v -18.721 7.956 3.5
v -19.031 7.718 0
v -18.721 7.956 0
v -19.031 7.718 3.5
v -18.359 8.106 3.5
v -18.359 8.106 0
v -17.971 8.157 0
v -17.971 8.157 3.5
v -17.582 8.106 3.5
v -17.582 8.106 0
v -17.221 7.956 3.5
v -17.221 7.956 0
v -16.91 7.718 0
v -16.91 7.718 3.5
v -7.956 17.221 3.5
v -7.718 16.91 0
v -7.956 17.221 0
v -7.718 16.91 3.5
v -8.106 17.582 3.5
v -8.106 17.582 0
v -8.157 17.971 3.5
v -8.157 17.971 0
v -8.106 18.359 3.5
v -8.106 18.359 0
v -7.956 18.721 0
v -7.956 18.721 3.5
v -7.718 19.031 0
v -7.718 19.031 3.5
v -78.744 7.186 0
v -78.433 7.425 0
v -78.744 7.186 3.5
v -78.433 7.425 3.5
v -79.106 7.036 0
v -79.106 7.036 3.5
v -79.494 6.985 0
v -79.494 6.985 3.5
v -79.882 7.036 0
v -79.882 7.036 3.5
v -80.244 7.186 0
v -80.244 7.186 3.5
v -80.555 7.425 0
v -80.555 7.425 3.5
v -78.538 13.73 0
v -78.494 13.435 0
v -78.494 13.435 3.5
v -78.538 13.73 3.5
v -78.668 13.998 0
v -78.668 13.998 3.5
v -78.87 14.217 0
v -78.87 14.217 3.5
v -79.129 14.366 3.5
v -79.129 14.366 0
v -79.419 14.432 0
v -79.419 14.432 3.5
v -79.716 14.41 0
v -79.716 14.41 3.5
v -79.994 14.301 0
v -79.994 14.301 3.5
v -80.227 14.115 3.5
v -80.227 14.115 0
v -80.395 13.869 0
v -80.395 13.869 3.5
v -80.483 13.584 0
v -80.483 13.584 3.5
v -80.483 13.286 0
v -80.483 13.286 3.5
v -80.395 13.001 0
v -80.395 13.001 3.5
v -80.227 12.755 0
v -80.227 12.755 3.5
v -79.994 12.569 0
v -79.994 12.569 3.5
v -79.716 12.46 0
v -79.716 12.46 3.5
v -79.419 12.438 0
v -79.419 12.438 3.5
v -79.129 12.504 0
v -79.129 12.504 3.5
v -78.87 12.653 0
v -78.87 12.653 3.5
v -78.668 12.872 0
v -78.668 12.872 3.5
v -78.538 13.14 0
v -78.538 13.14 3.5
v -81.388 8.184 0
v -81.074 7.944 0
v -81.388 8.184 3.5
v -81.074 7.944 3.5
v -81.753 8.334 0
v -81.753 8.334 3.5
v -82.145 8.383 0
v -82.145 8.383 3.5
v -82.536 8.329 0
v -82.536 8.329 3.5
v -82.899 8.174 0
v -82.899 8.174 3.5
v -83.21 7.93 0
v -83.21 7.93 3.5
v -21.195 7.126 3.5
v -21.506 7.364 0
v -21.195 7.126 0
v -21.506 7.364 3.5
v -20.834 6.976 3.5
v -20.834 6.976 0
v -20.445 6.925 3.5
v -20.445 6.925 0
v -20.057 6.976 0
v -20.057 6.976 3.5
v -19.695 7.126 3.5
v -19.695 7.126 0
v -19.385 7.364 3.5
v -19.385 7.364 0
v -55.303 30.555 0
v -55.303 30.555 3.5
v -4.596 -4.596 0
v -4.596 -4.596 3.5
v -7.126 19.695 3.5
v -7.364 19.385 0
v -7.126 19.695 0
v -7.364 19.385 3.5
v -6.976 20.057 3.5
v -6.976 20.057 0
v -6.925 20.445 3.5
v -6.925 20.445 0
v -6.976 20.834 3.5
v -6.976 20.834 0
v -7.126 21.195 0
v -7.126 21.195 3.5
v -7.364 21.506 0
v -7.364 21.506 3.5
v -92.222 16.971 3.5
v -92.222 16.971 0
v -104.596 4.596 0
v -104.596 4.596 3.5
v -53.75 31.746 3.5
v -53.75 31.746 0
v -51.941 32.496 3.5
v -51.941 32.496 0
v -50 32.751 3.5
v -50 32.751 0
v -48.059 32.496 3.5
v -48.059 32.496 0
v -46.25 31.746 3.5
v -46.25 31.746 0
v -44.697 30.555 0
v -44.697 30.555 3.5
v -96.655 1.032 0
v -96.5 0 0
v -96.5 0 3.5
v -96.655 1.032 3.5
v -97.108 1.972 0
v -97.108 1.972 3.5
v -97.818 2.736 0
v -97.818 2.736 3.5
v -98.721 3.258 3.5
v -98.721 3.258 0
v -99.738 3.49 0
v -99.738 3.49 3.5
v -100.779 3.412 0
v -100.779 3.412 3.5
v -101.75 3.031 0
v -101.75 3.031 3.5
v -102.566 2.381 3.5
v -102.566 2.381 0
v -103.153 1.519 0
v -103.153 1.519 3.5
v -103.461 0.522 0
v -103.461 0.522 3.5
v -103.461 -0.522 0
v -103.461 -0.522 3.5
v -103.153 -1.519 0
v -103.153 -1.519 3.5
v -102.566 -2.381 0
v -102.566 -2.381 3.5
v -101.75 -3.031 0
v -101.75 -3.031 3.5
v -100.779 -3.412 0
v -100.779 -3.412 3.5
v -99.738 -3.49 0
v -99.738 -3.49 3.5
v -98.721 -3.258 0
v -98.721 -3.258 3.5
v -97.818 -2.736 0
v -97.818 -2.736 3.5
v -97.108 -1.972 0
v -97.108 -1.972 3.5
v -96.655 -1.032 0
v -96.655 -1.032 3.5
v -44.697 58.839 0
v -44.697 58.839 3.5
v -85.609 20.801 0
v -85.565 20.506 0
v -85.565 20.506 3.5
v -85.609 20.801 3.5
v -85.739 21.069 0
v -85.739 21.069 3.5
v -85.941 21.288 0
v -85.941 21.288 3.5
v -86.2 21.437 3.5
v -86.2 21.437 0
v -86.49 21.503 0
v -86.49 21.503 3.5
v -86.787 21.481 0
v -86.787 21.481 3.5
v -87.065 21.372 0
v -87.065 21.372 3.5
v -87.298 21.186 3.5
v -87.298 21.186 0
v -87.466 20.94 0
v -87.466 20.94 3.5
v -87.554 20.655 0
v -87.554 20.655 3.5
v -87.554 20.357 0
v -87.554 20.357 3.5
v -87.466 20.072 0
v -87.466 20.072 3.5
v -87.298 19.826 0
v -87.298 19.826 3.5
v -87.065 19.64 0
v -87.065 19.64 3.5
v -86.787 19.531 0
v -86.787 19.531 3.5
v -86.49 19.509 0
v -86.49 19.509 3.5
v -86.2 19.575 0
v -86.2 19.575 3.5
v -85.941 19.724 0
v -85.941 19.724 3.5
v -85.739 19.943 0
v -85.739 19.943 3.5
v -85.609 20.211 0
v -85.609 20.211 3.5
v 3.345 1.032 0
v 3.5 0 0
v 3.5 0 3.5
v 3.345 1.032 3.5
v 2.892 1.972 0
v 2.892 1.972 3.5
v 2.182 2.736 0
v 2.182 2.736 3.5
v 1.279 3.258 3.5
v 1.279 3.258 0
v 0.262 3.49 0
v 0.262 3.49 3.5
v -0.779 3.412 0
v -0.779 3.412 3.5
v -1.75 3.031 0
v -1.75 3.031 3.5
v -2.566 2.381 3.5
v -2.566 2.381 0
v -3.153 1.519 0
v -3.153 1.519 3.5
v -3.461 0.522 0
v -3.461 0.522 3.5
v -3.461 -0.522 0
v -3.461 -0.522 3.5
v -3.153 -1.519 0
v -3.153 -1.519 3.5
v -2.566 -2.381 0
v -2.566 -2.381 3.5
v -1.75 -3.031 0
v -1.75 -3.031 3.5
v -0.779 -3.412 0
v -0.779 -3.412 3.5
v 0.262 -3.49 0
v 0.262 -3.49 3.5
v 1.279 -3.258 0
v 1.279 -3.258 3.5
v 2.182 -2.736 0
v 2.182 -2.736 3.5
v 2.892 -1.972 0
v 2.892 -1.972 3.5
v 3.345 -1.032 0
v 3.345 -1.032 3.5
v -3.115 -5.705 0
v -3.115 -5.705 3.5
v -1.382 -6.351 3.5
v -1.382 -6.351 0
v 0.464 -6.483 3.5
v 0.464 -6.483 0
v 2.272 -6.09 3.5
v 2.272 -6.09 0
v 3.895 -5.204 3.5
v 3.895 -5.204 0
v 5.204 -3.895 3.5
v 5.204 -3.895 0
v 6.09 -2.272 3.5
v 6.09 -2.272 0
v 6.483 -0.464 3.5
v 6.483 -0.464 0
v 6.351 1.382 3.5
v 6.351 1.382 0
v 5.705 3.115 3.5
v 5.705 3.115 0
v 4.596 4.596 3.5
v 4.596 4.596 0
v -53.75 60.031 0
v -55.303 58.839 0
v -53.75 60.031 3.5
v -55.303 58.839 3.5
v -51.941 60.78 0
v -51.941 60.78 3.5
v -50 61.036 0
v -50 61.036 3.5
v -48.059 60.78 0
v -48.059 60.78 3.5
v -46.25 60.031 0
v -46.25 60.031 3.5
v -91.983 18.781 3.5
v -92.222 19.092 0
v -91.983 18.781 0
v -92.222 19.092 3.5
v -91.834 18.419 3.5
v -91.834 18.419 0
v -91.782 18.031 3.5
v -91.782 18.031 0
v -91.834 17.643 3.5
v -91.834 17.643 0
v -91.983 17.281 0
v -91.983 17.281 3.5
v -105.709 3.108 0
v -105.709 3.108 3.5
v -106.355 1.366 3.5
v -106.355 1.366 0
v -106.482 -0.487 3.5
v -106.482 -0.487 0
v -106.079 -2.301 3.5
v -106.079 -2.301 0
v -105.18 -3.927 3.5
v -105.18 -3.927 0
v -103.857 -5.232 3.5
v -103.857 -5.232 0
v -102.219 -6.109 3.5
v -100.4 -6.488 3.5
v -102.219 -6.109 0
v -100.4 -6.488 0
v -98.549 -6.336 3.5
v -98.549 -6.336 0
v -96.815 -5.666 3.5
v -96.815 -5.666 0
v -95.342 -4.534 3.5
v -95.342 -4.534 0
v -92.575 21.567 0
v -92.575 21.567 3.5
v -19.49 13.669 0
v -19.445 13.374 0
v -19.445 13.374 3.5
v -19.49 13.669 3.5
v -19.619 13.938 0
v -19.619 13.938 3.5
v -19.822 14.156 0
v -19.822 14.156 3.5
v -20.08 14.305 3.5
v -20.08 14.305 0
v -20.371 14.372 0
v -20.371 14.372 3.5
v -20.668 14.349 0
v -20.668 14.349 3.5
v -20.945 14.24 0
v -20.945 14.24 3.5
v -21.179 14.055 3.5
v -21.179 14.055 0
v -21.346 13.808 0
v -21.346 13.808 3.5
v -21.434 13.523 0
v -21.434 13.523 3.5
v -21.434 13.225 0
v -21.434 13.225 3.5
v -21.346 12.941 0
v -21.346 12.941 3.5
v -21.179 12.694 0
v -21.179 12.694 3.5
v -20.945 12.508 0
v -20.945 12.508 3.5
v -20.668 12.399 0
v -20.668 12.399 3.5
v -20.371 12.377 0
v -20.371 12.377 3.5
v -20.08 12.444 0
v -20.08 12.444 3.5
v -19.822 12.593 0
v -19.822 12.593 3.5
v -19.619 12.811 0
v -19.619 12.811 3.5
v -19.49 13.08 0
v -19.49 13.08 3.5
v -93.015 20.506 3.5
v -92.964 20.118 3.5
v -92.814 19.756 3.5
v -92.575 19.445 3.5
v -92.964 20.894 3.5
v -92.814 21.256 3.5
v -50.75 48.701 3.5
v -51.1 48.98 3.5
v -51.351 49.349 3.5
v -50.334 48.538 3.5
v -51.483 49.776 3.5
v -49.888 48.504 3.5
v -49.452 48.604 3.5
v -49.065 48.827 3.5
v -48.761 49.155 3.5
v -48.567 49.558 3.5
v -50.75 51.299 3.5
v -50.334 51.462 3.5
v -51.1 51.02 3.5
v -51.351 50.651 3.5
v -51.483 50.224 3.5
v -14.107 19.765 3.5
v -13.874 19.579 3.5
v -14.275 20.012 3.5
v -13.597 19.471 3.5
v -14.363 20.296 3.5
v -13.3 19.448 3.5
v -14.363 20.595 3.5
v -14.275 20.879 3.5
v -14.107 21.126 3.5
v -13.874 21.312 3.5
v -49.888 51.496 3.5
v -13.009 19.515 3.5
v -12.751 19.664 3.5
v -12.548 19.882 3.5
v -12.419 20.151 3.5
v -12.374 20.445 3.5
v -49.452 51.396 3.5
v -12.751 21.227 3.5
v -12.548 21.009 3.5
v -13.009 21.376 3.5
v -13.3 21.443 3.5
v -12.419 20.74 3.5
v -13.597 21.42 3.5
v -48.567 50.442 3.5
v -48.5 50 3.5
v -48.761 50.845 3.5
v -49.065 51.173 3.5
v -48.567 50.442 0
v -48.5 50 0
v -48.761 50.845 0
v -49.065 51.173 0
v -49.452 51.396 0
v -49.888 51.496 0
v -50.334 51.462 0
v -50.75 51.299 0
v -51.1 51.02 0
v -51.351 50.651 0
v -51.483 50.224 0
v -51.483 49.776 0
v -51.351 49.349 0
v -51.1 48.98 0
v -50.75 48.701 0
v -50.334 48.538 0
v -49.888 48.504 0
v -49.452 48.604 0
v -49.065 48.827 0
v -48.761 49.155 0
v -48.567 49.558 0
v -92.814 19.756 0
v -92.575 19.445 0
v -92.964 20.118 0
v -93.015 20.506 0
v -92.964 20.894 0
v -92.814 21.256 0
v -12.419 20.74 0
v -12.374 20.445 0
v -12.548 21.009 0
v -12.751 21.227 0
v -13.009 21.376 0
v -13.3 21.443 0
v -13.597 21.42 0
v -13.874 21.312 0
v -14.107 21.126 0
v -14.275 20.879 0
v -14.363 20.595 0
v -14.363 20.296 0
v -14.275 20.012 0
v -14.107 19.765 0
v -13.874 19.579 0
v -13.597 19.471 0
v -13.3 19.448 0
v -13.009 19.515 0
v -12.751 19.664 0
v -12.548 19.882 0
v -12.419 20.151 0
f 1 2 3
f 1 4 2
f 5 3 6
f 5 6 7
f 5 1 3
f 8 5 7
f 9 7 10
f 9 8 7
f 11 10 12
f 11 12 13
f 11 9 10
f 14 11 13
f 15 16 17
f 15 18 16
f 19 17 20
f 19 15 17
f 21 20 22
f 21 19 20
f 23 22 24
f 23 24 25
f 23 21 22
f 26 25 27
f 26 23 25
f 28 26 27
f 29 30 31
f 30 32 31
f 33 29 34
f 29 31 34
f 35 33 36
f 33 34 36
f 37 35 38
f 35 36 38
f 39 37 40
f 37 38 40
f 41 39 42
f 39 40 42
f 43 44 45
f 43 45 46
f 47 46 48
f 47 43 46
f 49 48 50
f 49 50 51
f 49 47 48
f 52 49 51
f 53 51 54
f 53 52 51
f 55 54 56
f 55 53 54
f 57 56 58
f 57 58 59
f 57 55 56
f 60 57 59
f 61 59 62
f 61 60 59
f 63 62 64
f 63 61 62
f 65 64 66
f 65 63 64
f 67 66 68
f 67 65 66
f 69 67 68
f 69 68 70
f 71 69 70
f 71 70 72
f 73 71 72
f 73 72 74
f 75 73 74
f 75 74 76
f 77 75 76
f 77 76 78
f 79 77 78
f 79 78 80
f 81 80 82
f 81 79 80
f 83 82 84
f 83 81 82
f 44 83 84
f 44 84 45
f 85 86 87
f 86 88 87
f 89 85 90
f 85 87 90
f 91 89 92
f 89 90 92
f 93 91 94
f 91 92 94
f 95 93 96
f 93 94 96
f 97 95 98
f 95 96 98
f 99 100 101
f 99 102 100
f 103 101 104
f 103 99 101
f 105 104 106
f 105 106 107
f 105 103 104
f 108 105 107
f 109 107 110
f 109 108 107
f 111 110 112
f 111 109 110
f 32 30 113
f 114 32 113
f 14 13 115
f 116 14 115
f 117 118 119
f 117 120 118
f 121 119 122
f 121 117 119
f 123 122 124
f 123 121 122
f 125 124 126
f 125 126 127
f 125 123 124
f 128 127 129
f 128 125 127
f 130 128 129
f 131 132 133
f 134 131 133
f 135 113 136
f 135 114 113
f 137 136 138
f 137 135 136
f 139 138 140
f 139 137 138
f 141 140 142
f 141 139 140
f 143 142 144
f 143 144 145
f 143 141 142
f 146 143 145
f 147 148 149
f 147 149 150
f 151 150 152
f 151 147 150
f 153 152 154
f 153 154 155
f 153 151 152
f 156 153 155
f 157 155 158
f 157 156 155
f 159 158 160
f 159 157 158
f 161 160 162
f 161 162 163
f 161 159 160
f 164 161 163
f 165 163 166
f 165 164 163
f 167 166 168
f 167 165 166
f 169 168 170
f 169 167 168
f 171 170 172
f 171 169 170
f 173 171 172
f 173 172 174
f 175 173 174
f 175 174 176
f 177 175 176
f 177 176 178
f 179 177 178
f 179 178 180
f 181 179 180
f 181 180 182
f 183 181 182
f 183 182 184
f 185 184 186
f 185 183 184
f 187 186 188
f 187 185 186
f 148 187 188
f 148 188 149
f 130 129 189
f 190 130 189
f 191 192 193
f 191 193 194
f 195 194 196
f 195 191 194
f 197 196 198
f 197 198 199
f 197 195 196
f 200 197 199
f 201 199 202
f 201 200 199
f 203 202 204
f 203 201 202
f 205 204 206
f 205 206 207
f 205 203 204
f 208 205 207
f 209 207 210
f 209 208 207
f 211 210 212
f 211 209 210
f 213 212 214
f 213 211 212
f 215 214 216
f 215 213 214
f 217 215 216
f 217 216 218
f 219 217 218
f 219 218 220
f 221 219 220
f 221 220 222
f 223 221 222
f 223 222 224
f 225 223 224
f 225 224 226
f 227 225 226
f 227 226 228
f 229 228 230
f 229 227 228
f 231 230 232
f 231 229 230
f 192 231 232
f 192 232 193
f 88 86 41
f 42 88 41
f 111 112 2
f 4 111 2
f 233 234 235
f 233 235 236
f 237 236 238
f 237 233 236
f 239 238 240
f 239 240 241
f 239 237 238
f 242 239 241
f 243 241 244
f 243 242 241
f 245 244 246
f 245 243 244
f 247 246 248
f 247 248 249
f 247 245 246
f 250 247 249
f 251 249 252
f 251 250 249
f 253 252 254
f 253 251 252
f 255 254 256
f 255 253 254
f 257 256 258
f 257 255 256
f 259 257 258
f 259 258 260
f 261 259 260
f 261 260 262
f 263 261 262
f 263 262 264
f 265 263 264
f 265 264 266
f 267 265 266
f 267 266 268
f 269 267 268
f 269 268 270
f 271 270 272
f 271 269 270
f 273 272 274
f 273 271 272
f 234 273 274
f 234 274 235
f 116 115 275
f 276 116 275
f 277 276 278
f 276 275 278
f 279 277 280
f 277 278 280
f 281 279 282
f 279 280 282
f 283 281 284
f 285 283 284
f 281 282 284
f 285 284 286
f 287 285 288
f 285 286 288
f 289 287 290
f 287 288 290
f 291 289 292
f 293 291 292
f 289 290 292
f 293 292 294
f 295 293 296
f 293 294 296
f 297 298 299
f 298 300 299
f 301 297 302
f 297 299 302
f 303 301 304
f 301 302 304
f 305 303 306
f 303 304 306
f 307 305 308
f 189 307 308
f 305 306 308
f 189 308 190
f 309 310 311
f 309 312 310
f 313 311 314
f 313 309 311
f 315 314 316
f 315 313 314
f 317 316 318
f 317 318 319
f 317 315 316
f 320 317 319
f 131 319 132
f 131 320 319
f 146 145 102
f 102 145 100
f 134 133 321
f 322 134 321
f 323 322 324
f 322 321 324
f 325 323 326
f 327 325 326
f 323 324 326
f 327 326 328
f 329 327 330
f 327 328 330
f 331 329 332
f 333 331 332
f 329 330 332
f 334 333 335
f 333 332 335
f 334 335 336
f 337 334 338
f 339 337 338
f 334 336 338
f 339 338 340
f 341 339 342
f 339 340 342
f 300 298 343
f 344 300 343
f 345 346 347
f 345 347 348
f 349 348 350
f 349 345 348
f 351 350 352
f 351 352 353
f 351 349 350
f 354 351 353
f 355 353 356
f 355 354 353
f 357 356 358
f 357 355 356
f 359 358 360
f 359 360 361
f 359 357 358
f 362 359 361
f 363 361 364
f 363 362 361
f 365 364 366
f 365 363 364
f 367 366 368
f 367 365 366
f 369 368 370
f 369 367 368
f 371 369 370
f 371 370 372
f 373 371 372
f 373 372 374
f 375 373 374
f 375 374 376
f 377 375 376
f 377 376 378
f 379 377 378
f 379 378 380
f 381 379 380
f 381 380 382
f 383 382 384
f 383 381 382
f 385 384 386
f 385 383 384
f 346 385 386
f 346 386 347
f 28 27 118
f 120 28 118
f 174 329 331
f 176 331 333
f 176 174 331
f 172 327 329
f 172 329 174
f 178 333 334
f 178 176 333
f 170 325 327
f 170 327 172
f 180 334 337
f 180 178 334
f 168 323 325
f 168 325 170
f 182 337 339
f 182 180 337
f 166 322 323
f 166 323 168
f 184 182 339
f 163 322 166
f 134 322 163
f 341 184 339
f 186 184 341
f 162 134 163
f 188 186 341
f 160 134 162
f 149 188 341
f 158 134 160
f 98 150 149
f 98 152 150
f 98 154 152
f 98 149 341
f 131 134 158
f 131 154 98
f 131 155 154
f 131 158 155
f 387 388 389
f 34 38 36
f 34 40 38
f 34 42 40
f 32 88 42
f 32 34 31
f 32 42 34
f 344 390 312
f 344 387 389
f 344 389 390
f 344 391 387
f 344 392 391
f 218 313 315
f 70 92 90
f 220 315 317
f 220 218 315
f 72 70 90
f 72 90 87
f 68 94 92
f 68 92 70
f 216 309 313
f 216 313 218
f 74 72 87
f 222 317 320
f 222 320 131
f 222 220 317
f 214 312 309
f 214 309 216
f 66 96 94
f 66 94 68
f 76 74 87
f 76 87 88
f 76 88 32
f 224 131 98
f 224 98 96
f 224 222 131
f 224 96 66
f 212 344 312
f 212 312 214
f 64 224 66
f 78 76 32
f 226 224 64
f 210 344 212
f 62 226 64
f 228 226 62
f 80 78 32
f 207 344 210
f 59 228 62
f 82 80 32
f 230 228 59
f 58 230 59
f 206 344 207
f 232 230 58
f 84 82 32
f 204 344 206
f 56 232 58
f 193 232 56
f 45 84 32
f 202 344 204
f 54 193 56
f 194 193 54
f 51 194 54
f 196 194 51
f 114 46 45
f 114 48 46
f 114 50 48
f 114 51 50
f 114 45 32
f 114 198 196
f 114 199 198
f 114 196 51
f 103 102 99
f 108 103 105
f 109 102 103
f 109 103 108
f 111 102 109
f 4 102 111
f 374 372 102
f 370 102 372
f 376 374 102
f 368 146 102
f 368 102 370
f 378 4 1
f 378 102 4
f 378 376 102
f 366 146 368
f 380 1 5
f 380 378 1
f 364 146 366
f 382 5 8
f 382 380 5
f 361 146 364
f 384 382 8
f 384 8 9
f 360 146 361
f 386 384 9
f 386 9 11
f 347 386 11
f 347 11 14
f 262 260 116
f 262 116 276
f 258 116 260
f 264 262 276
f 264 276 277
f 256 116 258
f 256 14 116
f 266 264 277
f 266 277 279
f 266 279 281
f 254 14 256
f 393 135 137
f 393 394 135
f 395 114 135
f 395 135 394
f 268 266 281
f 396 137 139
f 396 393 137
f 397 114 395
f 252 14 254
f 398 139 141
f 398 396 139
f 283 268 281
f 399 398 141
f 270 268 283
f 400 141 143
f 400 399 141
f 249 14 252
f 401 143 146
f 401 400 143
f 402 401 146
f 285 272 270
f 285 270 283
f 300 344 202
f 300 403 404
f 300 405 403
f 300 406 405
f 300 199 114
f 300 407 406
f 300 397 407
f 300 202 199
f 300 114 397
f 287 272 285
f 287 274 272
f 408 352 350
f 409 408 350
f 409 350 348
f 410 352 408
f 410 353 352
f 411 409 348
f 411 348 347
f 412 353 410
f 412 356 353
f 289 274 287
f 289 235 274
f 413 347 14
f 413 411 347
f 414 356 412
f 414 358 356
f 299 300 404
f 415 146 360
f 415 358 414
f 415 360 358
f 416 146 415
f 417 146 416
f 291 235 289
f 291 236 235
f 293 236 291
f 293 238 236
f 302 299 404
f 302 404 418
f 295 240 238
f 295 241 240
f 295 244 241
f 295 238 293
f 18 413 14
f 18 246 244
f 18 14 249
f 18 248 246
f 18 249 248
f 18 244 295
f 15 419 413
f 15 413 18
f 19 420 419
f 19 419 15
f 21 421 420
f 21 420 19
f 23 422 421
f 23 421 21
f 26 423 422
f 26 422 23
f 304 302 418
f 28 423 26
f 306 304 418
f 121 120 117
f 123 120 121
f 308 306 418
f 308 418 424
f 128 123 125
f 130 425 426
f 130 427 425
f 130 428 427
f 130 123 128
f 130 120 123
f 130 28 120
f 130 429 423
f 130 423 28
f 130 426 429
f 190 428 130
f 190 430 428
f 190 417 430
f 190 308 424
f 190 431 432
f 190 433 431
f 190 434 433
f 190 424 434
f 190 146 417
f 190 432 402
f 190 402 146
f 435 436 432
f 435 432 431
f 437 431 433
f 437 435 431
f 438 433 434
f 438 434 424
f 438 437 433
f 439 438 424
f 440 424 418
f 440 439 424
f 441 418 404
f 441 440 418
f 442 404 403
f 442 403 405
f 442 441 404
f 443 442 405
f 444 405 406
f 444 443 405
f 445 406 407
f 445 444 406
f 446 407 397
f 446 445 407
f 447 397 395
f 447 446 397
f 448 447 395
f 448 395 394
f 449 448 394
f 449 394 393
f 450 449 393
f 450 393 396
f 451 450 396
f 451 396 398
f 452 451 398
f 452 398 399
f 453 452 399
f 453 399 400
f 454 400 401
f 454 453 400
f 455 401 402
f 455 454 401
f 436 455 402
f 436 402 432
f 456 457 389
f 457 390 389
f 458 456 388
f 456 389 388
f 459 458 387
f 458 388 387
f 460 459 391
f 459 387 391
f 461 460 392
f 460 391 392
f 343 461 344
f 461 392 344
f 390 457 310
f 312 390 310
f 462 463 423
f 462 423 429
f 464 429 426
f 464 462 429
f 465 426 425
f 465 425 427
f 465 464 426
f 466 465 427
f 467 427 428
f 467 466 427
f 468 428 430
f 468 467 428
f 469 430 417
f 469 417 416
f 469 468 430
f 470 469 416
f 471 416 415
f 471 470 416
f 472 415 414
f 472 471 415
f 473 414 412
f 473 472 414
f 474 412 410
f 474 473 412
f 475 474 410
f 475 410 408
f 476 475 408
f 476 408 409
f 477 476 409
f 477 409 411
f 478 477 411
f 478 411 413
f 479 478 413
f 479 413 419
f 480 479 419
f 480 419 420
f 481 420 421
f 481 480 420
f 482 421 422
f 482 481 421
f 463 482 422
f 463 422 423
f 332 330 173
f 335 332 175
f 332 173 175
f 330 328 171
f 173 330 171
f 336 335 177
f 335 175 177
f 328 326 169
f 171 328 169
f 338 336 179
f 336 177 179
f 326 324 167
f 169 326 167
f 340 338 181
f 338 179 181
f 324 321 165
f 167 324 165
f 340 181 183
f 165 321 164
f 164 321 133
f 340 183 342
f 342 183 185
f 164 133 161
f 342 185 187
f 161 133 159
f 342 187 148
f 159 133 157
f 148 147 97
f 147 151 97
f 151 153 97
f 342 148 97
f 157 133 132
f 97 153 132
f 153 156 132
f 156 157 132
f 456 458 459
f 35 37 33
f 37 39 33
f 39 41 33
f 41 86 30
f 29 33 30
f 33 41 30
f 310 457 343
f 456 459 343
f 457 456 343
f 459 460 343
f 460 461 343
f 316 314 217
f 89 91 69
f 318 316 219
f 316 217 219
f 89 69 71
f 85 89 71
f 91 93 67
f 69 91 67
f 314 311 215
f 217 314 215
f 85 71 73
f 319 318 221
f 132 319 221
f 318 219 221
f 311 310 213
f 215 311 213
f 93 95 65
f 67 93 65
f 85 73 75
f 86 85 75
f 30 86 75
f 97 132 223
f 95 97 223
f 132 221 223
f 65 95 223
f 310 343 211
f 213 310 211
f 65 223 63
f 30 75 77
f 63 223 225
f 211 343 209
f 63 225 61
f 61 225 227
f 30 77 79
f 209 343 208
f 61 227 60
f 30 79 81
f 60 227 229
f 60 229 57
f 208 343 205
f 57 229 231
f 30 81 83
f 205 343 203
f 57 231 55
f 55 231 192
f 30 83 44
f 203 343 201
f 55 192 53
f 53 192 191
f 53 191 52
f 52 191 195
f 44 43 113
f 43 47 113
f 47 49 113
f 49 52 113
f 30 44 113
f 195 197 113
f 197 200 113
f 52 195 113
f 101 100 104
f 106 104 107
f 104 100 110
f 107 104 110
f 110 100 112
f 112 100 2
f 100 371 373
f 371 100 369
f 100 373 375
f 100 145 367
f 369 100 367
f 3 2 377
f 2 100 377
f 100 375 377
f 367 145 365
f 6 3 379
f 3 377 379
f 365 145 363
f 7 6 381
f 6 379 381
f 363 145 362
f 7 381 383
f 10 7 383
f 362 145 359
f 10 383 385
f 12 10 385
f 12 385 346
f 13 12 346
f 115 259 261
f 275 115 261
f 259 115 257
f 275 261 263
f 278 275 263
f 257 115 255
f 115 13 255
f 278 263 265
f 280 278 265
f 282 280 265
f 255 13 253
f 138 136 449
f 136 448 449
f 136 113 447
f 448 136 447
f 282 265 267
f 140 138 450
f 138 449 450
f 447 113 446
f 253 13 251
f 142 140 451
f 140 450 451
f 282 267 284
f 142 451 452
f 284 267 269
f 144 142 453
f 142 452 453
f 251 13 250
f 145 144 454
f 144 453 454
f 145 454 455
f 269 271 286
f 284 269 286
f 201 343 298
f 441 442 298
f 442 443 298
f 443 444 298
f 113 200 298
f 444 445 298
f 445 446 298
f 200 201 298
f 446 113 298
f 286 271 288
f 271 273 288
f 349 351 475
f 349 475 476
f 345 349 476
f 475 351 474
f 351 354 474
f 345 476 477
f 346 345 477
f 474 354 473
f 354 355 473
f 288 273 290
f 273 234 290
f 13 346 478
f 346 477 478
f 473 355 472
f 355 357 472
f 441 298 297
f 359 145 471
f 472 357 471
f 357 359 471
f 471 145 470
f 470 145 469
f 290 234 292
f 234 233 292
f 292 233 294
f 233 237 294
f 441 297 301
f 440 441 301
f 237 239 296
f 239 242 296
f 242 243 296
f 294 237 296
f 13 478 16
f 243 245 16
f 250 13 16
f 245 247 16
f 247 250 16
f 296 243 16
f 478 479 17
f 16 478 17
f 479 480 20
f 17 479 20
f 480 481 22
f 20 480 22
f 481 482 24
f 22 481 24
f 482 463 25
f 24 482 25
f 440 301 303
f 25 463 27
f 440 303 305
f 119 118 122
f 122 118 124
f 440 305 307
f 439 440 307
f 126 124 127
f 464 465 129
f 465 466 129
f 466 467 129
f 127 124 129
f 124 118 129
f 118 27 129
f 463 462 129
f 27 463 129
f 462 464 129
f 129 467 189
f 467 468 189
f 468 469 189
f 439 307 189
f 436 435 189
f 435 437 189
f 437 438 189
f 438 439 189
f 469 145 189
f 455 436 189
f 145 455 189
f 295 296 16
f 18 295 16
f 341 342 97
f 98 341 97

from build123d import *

# Parameters (mm, degrees)
SKETCH7_R           = 3.5
SKETCH7_R_2         = 1
SKETCH7_R_3         = 1.5
BOSS_EXTRUDE1_DEPTH = 3.5
FILLET1_R           = 7.5
FILLET2_R           = 7.5
FILLET3_R           = 1.5
FILLET4_R           = 1.5
FILLET5_R           = 1.5


with BuildPart() as part:
    # Sketch7 → Boss-Extrude1 (new body)
    with BuildSketch(Plane.XY):
        with BuildLine():
            Line((-91.161165235, 18.03122292), (-104.596194078, 4.596194078))
            ThreePointArc((-104.596194078, 4.596194078), (-104.565177968, -4.627002282), (-95.342398812, -4.533955357))
            Line((-95.342398812, -4.533955357), (-82.149090724, 9.019148409))
            Line((-82.149090724, 9.019148409), (-79.493903346, 6.363961031))
            Line((-79.493903346, 6.363961031), (-50, 35.857864376))
            Line((-50, 35.857864376), (-20.445483687, 6.303348063))
            Line((-20.445483687, 6.303348063), (-17.970609953, 8.778221797))
            Line((-17.970609953, 8.778221797), (-4.596194078, -4.596194078))
            ThreePointArc((-4.596194078, -4.596194078), (4.596194078, -4.596194078), (4.596194078, 4.596194078))
            Line((4.596194078, 4.596194078), (-8.778221797, 17.970609953))
            Line((-8.778221797, 17.970609953), (-6.303348063, 20.445483687))
            Line((-6.303348063, 20.445483687), (-50, 64.142135624))
            Line((-50, 64.142135624), (-93.636038969, 20.506096654))
            Line((-93.636038969, 20.506096654), (-91.161165235, 18.03122292))
        make_face()
        Circle(SKETCH7_R, mode=Mode.SUBTRACT)
        with Locations((-100, 0)):
            Circle(SKETCH7_R, mode=Mode.SUBTRACT)
        with Locations((-86.564971157, 20.506096654)):
            Circle(SKETCH7_R_2, mode=Mode.SUBTRACT)
        with Locations((-50, 50)):
            Circle(SKETCH7_R_3, mode=Mode.SUBTRACT)
        with Locations((-13.374415875, 20.445483687)):
            Circle(SKETCH7_R_2, mode=Mode.SUBTRACT)
        with Locations((-20.445483687, 13.374415875)):
            Circle(SKETCH7_R_2, mode=Mode.SUBTRACT)
        with Locations((-79.493903346, 13.435028843)):
            Circle(SKETCH7_R_2, mode=Mode.SUBTRACT)
    extrude(amount=BOSS_EXTRUDE1_DEPTH)

    # Fillet1
    fillet1_edges = [part.edges().sort_by_distance(p)[0] for p in [
        (-50, 64.142135624, 1.75),
    ]]
    fillet(fillet1_edges, radius=FILLET1_R)

    # Fillet2
    fillet2_edges = [part.edges().sort_by_distance(p)[0] for p in [
        (-50, 35.857864376, 1.75),
    ]]
    fillet(fillet2_edges, radius=FILLET2_R)

    # Fillet3
    fillet3_edges = [part.edges().sort_by_distance(p)[0] for p in [
        (-82.149090724, 9.019148409, 1.75),
        (-93.636038969, 20.506096654, 1.75),
        (-17.970609953, 8.778221797, 1.75),
        (-20.445483687, 6.303348063, 1.75),
        (-79.493903346, 6.363961031, 1.75),
    ]]
    fillet(fillet3_edges, radius=FILLET3_R)

    # Fillet4
    fillet4_edges = [part.edges().sort_by_distance(p)[0] for p in [
        (-6.303348063, 20.445483687, 1.75),
        (-8.778221797, 17.970609953, 1.75),
    ]]
    fillet(fillet4_edges, radius=FILLET4_R)

    # Fillet5
    fillet5_edges = [part.edges().sort_by_distance(p)[0] for p in [
        (-91.161165235, 18.03122292, 1.75),
    ]]
    fillet(fillet5_edges, radius=FILLET5_R)


solid = part.part
